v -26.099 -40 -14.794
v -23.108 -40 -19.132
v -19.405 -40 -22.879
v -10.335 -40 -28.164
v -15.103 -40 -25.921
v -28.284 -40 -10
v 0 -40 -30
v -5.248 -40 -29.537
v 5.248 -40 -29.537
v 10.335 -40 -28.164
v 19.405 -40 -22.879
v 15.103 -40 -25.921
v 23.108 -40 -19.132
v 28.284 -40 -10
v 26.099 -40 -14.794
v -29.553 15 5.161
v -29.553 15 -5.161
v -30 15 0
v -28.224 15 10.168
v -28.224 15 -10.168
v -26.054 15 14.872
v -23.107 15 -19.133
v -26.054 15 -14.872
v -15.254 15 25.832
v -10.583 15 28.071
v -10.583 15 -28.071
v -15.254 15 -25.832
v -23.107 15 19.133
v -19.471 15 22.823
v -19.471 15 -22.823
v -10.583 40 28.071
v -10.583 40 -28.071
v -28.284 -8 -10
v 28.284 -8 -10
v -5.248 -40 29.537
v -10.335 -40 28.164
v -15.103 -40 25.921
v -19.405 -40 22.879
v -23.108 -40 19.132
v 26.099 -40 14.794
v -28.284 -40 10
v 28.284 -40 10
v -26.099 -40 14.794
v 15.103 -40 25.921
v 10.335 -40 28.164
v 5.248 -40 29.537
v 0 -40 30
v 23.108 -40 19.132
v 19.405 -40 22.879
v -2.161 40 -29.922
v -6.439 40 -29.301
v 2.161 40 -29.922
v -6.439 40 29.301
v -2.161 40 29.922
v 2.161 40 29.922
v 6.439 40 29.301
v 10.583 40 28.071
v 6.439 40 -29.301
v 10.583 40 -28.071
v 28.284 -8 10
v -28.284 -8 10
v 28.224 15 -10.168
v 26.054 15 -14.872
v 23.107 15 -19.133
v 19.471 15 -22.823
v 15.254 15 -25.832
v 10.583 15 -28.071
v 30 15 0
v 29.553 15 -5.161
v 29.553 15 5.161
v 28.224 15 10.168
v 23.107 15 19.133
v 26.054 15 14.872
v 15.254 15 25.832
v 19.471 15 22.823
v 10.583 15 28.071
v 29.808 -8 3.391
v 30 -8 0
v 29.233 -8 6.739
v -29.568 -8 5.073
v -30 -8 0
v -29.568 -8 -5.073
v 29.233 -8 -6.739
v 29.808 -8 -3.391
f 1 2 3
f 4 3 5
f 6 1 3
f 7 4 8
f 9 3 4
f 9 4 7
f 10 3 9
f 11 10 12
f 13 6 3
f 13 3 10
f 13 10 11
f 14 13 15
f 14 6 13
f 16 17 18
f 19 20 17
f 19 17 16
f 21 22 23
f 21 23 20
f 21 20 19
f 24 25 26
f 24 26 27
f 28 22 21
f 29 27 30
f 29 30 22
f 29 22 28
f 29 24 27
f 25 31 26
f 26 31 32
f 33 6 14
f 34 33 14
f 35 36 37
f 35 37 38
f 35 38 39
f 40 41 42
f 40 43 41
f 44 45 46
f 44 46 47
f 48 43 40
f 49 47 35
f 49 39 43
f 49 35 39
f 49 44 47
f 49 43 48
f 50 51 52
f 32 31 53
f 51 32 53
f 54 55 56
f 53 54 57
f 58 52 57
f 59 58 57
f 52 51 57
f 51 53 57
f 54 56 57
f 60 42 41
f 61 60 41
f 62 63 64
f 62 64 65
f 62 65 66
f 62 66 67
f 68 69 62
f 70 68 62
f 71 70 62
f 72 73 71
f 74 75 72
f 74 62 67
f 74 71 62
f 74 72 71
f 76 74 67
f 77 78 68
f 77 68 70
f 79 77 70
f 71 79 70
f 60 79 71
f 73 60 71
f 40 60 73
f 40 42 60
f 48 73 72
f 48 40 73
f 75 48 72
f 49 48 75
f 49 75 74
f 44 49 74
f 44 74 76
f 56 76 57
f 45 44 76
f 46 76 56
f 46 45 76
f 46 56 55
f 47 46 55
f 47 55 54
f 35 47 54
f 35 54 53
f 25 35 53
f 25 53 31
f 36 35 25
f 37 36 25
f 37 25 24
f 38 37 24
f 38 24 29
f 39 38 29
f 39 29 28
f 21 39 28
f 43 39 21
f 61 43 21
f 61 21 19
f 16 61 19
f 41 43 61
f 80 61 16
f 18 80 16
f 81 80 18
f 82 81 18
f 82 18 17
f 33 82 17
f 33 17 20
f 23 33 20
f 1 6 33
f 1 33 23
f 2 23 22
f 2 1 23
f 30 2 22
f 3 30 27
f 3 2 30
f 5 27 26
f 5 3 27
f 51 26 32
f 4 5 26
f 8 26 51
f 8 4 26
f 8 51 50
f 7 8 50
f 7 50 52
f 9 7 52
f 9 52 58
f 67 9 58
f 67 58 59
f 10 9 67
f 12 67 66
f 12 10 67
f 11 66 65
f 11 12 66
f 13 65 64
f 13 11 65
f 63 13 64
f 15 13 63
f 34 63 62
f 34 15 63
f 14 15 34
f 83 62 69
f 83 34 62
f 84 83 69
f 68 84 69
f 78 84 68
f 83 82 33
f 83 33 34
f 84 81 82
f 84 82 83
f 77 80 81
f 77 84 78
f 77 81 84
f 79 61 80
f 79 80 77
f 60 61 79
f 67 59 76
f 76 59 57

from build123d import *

# Parameters (mm, degrees)
F0_R     = 30
F1_DEPTH = 40
F3_DEPTH = 32
F5_DEPTH = 25


with BuildPart() as f1:
    # F0 (on Front) → F1 (new body, symmetric)
    with BuildSketch(Plane.XZ):
        Circle(F0_R)
    extrude(amount=F1_DEPTH, both=True)

    # F2 (on face) → F3 (cut)
    with BuildSketch(Plane.XZ.offset(40)):
        with BuildLine():
            Line((28.2842712475, 10), (-28.2842712475, 10))
            ThreePointArc((-28.2842712475, 10), (-30, 0), (-28.2842712475, -10))
            Line((-28.2842712475, -10), (28.2842712475, -10))
            ThreePointArc((28.2842712475, -10), (29.5679567896, -5.0730593618), (30, 0))
            ThreePointArc((30, 0), (29.5679567896, 5.0730593618), (28.2842712475, 10))
        make_face()
    extrude(amount=-F3_DEPTH, mode=Mode.SUBTRACT)

    # F4 (on face) → F5 (cut)
    with BuildSketch(Plane(origin=(0, 40, 0), x_dir=(-1, 0, 0), z_dir=(0, 1, 0))):
        with BuildLine():
            Line((10.5825905188, 28.0714940449), (10.5825905188, -28.0714940449))
            ThreePointArc((10.5825905188, -28.0714940449), (24.6726337828, -17.0663746067), (30, 0))
            ThreePointArc((30, 0), (24.6726337828, 17.0663746067), (10.5825905188, 28.0714940449))
        make_face()
        with BuildLine():
            ThreePointArc((-10.5825905188, 28.0714940449), (-30, 0), (-10.5825905188, -28.0714940449))
            Line((-10.5825905188, -28.0714940449), (-10.5825905188, 28.0714940449))
        make_face()
    extrude(amount=-F5_DEPTH, mode=Mode.SUBTRACT)


solid = f1.part
